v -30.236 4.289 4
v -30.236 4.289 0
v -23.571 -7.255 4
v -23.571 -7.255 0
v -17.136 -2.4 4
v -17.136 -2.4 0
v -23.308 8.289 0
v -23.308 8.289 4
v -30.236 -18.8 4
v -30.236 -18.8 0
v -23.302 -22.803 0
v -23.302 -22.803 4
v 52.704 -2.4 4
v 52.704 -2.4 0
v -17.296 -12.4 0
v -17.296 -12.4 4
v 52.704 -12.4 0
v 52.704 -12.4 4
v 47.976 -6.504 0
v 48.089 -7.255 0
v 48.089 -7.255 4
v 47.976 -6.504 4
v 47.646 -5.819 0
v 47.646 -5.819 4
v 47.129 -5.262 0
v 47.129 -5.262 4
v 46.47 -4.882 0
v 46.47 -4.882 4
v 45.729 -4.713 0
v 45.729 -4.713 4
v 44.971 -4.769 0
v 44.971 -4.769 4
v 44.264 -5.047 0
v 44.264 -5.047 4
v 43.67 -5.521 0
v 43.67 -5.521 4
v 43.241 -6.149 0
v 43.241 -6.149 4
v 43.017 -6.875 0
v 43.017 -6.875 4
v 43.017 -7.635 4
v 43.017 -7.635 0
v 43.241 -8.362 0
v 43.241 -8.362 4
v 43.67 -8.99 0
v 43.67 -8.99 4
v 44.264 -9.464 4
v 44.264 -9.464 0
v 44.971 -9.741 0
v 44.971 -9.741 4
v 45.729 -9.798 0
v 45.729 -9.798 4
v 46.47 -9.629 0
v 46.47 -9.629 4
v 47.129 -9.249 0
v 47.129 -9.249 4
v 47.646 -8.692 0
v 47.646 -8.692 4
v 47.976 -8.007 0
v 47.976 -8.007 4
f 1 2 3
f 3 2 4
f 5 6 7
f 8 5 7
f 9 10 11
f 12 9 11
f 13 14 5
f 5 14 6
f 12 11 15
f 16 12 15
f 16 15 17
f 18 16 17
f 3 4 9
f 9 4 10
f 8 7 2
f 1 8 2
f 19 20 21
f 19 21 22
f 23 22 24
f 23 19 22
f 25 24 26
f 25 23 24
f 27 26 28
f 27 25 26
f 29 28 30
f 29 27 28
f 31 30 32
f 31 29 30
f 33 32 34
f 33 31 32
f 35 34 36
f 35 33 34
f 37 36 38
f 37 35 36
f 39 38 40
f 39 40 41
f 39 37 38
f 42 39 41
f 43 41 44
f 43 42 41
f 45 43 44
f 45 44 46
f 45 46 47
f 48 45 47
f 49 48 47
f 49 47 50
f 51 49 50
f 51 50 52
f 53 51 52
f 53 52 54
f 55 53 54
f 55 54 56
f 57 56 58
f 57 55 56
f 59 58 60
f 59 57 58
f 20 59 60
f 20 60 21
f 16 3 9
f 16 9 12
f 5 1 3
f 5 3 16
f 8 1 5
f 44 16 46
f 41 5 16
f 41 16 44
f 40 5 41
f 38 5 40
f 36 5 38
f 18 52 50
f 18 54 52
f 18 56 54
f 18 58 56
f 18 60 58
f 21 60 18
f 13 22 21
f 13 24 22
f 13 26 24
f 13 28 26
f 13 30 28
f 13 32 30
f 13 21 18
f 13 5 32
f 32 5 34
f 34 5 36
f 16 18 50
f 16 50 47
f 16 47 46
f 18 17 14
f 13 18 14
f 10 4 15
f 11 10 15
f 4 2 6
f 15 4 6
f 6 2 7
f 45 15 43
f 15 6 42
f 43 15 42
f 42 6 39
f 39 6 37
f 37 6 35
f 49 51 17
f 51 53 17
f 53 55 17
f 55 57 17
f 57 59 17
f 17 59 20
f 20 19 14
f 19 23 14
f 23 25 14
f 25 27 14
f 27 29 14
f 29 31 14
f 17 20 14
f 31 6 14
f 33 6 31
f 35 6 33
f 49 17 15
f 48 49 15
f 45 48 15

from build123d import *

# Parameters (mm, degrees)
ESBO_O1_R                = 2.55
RESSALTO_EXTRUS_O1_DEPTH = 4


with BuildPart() as part:
    # Esboço1 → Ressalto-extrusão1 (new body)
    with BuildSketch(Plane.XY):
        Polygon((52.704190952, -2.400470185), (-17.136160755, -2.400470185), (-23.307642689, 8.288850082), (-30.235845919, 4.288850082), (-23.57078241, -7.255378552), (-30.235845919, -18.799607186), (-23.301725869, -22.803023264), (-17.295809048, -12.400470185), (52.704190952, -12.400470185), align=None)
        with Locations((45.538806525, -7.255378552)):
            Circle(ESBO_O1_R, mode=Mode.SUBTRACT)
    extrude(amount=RESSALTO_EXTRUS_O1_DEPTH)


solid = part.part
